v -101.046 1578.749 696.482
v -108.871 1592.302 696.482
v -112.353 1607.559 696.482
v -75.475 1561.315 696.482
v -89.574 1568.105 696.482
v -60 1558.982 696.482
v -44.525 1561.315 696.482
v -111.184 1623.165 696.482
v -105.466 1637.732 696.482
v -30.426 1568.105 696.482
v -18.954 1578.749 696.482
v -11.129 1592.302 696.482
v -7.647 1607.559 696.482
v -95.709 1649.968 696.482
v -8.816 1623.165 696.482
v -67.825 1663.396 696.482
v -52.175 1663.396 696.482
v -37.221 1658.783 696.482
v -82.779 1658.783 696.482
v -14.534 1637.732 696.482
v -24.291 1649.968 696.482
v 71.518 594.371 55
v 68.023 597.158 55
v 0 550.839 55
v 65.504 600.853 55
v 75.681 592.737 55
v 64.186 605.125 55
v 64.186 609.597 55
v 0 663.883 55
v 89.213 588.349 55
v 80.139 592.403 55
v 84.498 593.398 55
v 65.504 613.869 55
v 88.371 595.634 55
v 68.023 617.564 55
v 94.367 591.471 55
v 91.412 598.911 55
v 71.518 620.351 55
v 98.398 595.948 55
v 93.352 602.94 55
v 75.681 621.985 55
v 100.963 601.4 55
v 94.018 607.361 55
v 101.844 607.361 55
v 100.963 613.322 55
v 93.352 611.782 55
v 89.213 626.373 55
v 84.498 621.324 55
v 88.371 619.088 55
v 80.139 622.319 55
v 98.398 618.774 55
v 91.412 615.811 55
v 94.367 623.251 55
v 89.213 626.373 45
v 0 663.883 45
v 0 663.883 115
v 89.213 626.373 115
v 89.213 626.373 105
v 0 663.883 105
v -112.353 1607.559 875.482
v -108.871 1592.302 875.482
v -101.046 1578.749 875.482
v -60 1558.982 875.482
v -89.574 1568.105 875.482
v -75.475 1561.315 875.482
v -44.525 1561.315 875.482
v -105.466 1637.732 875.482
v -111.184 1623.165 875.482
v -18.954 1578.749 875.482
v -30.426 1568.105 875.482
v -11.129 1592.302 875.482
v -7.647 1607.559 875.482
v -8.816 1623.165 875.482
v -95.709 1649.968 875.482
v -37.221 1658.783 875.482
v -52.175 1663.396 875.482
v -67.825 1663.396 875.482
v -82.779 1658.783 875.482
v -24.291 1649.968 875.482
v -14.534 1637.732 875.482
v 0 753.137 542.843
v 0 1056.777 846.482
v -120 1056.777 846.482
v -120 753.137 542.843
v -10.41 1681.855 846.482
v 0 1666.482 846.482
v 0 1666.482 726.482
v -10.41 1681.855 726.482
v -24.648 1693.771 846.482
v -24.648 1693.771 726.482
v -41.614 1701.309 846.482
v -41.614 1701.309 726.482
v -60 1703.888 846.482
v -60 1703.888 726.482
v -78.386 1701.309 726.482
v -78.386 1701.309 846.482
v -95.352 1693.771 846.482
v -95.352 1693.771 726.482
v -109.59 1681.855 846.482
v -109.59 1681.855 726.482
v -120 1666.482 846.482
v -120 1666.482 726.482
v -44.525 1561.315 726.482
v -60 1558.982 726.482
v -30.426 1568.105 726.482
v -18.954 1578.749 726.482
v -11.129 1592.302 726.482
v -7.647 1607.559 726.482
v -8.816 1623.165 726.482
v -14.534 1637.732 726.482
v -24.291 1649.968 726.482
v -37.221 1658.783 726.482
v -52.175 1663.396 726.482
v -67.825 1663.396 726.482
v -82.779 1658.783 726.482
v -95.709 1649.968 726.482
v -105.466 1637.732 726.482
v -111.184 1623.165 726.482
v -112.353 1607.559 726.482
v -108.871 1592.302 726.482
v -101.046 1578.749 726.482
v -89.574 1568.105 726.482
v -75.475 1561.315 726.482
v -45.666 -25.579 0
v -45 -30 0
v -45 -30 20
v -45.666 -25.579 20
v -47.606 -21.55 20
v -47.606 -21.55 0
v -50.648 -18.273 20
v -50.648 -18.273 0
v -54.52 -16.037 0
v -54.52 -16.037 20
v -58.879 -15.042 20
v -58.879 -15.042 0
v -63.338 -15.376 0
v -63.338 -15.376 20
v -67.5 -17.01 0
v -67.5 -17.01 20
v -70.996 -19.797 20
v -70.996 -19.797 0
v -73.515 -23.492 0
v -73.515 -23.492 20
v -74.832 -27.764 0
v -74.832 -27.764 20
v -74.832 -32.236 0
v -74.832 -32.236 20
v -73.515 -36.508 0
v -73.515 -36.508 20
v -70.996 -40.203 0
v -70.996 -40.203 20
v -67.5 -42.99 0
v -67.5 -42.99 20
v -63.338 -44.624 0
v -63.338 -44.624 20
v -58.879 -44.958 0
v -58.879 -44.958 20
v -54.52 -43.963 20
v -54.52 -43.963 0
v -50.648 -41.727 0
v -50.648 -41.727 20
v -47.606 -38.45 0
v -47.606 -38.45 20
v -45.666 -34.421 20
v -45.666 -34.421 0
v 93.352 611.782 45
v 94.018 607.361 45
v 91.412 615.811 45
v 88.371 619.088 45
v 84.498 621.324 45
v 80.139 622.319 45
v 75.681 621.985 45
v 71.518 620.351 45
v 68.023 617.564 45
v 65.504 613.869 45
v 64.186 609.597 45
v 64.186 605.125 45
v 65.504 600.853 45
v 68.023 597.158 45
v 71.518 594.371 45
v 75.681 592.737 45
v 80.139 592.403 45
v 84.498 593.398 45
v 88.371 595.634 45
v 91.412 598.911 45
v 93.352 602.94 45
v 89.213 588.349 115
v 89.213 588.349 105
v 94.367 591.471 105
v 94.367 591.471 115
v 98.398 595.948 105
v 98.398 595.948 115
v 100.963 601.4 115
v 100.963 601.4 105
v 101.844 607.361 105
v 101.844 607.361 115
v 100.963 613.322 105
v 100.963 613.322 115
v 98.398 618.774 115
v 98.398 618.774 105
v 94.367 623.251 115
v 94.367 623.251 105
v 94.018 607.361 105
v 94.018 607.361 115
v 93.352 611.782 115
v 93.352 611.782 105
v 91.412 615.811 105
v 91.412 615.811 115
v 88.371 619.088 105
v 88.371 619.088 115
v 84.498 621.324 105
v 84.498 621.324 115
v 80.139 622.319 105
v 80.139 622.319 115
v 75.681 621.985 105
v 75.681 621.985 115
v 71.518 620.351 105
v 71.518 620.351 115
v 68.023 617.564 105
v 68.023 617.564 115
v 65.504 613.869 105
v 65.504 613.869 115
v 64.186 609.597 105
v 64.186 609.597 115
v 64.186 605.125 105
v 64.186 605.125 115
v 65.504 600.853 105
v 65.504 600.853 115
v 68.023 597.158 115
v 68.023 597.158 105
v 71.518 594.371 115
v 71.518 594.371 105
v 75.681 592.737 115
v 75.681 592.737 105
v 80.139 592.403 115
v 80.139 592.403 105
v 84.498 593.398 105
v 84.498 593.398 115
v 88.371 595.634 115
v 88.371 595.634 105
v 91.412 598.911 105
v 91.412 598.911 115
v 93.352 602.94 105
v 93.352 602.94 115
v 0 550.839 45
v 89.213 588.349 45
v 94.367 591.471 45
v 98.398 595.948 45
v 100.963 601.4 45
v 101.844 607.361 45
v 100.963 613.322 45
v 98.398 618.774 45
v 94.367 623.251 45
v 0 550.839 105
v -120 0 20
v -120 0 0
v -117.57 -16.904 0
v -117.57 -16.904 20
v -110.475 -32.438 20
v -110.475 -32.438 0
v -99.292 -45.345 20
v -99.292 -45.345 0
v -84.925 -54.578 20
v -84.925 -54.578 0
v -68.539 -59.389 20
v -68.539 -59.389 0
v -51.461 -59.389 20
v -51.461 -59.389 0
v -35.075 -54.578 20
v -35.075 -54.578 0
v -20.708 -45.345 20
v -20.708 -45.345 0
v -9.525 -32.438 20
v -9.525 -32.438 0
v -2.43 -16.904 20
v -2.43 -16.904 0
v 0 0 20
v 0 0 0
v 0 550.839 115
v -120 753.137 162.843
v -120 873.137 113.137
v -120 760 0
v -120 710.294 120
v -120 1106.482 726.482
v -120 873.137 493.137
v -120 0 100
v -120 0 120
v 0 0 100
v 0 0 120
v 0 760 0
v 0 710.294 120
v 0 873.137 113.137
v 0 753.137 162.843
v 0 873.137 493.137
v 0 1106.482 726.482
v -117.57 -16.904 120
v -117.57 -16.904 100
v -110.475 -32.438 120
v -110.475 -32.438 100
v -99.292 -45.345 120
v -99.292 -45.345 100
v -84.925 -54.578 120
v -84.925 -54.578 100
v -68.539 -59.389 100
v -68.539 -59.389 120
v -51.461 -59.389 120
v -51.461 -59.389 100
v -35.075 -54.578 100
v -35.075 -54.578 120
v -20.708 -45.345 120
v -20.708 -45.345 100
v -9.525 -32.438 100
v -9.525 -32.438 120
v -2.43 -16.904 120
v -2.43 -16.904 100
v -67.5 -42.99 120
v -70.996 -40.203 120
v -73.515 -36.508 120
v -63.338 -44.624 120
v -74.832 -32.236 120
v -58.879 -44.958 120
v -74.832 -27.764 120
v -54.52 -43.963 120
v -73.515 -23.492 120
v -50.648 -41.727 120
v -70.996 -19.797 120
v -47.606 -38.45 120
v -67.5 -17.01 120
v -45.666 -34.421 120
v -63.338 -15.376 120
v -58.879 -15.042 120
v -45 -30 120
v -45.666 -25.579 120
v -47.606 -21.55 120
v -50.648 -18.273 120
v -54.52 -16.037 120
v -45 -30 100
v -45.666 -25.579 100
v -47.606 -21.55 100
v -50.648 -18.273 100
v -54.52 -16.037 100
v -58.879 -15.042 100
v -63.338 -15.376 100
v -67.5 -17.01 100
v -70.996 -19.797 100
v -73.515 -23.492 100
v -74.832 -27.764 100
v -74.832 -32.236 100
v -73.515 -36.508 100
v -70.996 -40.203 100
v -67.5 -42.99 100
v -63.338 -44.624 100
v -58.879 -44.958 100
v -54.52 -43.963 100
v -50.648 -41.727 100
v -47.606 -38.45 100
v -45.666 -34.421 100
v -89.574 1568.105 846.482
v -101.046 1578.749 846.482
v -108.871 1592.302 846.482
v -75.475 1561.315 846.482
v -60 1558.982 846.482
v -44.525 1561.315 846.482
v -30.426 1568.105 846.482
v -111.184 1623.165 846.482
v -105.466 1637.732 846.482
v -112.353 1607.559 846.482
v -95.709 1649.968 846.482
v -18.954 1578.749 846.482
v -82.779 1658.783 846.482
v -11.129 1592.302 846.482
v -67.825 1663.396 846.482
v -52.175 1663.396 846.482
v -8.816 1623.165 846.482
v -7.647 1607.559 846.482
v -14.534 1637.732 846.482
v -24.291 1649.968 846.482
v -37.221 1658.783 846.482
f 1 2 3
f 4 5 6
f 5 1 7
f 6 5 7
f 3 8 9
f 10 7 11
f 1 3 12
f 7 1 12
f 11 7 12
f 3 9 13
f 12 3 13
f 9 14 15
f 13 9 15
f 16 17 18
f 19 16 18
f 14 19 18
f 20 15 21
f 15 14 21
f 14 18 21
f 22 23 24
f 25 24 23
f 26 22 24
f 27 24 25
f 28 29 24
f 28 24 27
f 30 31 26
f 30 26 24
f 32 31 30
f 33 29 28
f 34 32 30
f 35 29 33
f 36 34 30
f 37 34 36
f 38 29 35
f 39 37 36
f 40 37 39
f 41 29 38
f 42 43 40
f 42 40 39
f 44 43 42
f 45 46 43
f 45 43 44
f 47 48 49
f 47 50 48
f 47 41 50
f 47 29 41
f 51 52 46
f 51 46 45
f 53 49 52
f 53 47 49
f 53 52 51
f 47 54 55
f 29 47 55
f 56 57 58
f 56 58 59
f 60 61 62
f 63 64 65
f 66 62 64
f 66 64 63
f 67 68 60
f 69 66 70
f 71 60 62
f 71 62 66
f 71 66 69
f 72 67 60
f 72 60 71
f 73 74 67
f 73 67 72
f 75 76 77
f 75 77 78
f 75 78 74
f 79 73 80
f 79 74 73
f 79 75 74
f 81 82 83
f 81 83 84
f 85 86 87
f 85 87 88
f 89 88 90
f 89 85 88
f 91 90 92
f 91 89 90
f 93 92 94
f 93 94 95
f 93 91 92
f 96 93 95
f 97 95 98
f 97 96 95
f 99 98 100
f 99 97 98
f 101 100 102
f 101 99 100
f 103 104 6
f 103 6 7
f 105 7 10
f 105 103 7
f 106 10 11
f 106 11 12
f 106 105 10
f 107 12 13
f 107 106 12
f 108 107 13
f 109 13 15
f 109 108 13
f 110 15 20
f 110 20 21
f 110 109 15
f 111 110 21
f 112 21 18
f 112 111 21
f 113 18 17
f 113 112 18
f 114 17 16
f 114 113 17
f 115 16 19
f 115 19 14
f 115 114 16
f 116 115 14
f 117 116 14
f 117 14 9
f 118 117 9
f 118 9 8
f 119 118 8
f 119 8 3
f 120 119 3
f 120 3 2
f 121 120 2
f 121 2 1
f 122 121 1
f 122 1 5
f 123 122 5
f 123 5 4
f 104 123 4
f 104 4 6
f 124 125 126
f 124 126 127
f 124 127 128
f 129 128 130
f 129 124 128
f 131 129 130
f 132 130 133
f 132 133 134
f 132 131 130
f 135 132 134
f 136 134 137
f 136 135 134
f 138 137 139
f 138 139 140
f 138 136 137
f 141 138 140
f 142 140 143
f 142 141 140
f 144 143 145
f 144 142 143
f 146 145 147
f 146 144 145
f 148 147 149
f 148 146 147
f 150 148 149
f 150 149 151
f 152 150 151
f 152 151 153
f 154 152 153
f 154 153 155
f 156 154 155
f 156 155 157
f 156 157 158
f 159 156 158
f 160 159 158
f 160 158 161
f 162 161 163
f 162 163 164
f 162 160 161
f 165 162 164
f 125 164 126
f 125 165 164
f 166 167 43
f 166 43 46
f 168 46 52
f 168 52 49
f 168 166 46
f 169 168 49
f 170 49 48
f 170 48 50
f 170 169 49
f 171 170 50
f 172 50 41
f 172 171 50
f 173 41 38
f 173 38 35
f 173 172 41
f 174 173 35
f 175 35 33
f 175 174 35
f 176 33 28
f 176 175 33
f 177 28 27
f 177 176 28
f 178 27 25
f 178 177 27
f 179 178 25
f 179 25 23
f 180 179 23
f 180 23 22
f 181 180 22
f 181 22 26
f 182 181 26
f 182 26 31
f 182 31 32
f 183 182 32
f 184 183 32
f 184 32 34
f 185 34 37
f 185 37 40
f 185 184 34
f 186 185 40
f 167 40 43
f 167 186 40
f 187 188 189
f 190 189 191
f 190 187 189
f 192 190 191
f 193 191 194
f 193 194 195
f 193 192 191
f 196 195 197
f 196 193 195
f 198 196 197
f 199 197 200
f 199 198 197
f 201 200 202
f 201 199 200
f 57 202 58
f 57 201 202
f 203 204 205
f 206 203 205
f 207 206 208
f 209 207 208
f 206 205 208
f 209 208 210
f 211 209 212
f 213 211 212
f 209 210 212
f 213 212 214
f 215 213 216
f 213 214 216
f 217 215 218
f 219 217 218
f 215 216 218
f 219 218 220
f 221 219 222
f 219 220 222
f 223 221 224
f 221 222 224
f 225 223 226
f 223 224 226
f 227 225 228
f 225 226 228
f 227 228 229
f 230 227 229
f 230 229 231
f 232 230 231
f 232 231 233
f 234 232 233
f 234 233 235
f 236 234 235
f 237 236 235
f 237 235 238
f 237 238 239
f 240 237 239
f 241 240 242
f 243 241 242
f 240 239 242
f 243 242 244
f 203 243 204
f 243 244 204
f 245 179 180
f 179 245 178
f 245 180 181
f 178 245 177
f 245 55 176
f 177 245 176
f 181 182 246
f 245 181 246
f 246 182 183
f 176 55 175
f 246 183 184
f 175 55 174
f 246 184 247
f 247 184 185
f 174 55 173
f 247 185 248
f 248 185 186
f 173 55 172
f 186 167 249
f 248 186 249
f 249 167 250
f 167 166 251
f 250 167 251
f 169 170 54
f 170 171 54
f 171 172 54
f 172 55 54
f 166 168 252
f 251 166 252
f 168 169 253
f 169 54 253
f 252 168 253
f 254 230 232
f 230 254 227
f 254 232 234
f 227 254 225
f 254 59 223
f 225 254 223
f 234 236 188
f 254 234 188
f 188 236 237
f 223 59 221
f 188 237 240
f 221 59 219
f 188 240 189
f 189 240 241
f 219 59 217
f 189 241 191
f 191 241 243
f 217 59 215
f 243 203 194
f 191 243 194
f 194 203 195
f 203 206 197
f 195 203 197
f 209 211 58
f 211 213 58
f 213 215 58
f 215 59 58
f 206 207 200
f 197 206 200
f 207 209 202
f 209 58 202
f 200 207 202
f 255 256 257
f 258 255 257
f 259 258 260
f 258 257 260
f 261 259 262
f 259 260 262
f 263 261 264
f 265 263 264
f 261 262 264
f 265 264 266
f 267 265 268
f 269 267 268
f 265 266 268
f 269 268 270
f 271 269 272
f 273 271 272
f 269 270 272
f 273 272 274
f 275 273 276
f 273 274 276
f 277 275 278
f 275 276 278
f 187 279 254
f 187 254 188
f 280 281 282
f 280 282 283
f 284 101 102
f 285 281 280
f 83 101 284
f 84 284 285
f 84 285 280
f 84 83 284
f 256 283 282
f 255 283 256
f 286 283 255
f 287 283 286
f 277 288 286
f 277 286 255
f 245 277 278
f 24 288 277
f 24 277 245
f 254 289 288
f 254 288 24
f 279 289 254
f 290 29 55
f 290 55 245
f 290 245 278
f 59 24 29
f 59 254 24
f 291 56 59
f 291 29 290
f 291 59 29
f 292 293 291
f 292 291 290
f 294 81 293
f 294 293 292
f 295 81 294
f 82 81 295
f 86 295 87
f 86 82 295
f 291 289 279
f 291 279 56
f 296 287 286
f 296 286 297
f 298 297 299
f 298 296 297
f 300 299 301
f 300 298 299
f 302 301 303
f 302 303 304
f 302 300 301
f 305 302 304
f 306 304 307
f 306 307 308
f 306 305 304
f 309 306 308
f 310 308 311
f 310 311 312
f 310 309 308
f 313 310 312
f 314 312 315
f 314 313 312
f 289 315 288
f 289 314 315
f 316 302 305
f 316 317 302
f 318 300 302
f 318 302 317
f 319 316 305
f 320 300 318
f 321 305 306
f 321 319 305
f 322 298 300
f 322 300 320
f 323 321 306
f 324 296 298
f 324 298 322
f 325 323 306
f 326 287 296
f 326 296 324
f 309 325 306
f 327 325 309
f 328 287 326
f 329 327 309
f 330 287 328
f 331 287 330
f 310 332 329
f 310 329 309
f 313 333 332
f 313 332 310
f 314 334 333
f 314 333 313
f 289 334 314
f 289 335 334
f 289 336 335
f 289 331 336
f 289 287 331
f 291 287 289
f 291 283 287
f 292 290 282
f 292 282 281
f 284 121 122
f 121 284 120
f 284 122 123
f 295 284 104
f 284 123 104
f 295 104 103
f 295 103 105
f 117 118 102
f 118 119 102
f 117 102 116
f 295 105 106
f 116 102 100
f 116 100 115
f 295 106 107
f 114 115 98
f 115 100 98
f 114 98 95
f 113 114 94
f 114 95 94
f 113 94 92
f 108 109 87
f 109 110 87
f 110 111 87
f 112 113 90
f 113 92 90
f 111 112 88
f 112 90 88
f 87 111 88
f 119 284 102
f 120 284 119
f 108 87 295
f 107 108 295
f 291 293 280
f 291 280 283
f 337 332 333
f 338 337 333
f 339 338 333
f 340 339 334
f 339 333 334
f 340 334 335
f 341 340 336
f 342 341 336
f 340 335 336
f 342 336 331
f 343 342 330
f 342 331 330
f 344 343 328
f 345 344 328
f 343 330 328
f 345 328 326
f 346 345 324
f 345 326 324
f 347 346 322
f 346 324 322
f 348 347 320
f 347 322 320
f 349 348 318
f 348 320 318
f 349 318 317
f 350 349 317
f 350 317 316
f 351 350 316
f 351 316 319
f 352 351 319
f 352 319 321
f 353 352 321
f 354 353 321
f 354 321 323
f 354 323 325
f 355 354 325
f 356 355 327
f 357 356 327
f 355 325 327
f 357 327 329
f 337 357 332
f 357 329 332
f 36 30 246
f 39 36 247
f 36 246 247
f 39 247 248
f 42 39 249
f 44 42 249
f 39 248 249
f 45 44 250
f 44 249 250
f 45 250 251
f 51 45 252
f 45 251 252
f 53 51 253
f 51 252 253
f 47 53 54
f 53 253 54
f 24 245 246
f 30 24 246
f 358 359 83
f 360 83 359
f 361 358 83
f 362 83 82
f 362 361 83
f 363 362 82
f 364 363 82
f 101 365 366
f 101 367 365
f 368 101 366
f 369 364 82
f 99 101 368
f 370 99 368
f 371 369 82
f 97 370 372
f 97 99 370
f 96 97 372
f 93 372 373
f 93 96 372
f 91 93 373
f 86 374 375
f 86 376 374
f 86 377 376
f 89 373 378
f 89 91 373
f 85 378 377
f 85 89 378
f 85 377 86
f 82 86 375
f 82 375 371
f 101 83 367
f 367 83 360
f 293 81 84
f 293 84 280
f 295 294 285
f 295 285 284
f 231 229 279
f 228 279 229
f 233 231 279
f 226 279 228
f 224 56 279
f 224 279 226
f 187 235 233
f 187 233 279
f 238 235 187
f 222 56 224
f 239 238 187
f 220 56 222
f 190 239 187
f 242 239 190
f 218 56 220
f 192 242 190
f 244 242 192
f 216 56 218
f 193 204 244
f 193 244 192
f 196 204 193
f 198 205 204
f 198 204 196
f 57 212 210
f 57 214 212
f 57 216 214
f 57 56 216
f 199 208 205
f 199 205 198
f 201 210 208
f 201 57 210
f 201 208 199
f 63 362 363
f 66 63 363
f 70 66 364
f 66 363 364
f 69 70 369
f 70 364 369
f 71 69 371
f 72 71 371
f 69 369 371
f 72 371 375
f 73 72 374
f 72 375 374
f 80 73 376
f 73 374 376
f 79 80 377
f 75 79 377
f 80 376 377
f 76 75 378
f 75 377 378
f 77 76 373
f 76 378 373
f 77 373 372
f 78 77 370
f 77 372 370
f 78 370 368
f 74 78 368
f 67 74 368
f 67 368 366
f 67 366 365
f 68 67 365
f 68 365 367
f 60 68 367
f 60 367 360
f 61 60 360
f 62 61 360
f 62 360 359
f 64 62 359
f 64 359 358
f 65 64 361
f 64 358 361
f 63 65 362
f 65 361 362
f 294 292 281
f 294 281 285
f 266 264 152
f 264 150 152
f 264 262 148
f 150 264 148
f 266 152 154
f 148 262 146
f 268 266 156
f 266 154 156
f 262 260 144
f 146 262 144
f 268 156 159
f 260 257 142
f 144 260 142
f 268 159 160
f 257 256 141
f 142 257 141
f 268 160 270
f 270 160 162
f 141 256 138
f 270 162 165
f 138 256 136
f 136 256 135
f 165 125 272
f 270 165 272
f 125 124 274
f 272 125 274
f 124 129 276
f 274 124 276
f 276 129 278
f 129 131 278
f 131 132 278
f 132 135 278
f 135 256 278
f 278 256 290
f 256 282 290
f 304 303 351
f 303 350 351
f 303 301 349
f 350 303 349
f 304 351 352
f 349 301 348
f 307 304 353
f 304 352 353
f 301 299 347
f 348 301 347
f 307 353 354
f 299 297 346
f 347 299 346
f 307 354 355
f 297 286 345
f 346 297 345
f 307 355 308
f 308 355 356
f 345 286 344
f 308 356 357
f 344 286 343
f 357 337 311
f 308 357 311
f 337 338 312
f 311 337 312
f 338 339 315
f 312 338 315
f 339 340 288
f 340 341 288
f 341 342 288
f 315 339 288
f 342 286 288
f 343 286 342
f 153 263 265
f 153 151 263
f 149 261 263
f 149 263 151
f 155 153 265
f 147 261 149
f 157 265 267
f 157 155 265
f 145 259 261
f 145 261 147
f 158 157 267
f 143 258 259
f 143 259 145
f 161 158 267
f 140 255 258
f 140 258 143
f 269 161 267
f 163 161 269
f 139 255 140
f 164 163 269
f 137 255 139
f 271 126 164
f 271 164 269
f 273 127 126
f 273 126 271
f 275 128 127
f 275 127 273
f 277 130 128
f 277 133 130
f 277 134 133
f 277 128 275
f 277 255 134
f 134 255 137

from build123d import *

# Parameters (mm, degrees)
F1_DEPTH  = 120
F2_R      = 15
F3_DEPTH  = 20
F6_DEPTH  = 120
F7_DEPTH  = 29
F8_DEPTH  = 150
F11_R     = 15
F12_DEPTH = 10


# Not quite as in the source:
# - a pattern or mirror of a feature is missing from the dataset's text; its kind, count and spacing are read off the source's solid


with BuildPart() as f1:
    # F0 (on Right) → F1 (new body)
    with BuildSketch(Plane.YZ):
        Polygon((0, 120), (0, 0), (700, 0), (760, 0), (873.1370849898, 113.1370849898), (873.1370849898, 493.1370849898), (1106.4823227814, 726.4823227814), (1556.4823227814, 726.4823227814), (1556.4823227814, 846.4823227814), (1056.7766952966, 846.4823227814), (753.1370849898, 542.8427124746), (753.1370849898, 162.8427124746), (710.2943725152, 120), (700, 120), align=None)
    extrude(amount=-F1_DEPTH)

    # F2 (on face) → F3 (join)
    with BuildSketch(Plane.XY.offset(120)):
        with BuildLine():
            Line((0, 0), (-120, 0))
            ThreePointArc((-120, 0), (-60, -60), (0, 0))
        make_face()
        with Locations((-60, -30)):
            Circle(F2_R, mode=Mode.SUBTRACT)
    f3 = extrude(amount=-F3_DEPTH)

    # F3_copies: F3 across plane
    add(f3.mirror(Plane(origin=(0, 0, 60), x_dir=(-1, 0, 0), z_dir=(0, 0, -1))))

    # F5 (on face) → F6 (join)
    with BuildSketch(Plane.XY.offset(846.4823227814)):
        Polygon((-120, 1556.4823227814), (-60, 1556.4823227814), (0, 1556.4823227814), (0, 1666.4823227814), (-120, 1666.4823227814), align=None)
        with BuildLine():
            ThreePointArc((-7.5, 1611.4823227814), (-22.8768939877, 1574.3592167691), (-60, 1558.9823227814))
            ThreePointArc((-60, 1558.9823227814), (-97.1231060123, 1648.6054287937), (-7.5, 1611.4823227814))
        make_face(mode=Mode.SUBTRACT)
        with BuildLine():
            ThreePointArc((-7.5, 1611.4823227814), (-97.1231060123, 1648.6054287937), (-60, 1558.9823227814))
            ThreePointArc((-60, 1558.9823227814), (-22.8768939877, 1574.3592167691), (-7.5, 1611.4823227814))
        make_face()
        with BuildLine():
            Line((-120, 1666.4823227814), (0, 1666.4823227814))
            ThreePointArc((0, 1666.4823227814), (-60, 1703.8881069987), (-120, 1666.4823227814))
        make_face()
    extrude(amount=-F6_DEPTH)

    # F5 (on face) → F7 (join)
    with BuildSketch(Plane.XY.offset(846.4823227814)):
        with BuildLine():
            ThreePointArc((-7.5, 1611.4823227814), (-97.1231060123, 1648.6054287937), (-60, 1558.9823227814))
            ThreePointArc((-60, 1558.9823227814), (-22.8768939877, 1574.3592167691), (-7.5, 1611.4823227814))
        make_face()
    extrude(amount=F7_DEPTH)

    # F5 (on face) → F8 (join)
    with BuildSketch(Plane.XY.offset(846.4823227814)):
        with BuildLine():
            ThreePointArc((-7.5, 1611.4823227814), (-97.1231060123, 1648.6054287937), (-60, 1558.9823227814))
            ThreePointArc((-60, 1558.9823227814), (-22.8768939877, 1574.3592167691), (-7.5, 1611.4823227814))
        make_face()
    extrude(amount=-F8_DEPTH)

    # F11 (on offset) → F12 (join)
    with BuildSketch(Plane.XY.offset(115)):
        with BuildLine():
            Line((89.2130512357, 626.3729619547), (-2.970210975, 665.1317824757))
            Line((-2.970210975, 665.1317824757), (-2.970210975, 549.5901644294))
            Line((-2.970210975, 549.5901644294), (89.2130512357, 588.3489849504))
            ThreePointArc((89.2130512357, 588.3489849504), (101.8435068324, 607.3609734525), (89.2130512357, 626.3729619547))
        make_face()
        with Locations((79.0183379768, 607.3609734525)):
            Circle(F11_R, mode=Mode.SUBTRACT)
    f12 = extrude(amount=-F12_DEPTH)

    # F12_copies: F12 across plane
    add(f12.mirror(Plane(origin=(0, 0, 80), x_dir=(-1, 0, 0), z_dir=(0, 0, -1))))


solid = f1.part
